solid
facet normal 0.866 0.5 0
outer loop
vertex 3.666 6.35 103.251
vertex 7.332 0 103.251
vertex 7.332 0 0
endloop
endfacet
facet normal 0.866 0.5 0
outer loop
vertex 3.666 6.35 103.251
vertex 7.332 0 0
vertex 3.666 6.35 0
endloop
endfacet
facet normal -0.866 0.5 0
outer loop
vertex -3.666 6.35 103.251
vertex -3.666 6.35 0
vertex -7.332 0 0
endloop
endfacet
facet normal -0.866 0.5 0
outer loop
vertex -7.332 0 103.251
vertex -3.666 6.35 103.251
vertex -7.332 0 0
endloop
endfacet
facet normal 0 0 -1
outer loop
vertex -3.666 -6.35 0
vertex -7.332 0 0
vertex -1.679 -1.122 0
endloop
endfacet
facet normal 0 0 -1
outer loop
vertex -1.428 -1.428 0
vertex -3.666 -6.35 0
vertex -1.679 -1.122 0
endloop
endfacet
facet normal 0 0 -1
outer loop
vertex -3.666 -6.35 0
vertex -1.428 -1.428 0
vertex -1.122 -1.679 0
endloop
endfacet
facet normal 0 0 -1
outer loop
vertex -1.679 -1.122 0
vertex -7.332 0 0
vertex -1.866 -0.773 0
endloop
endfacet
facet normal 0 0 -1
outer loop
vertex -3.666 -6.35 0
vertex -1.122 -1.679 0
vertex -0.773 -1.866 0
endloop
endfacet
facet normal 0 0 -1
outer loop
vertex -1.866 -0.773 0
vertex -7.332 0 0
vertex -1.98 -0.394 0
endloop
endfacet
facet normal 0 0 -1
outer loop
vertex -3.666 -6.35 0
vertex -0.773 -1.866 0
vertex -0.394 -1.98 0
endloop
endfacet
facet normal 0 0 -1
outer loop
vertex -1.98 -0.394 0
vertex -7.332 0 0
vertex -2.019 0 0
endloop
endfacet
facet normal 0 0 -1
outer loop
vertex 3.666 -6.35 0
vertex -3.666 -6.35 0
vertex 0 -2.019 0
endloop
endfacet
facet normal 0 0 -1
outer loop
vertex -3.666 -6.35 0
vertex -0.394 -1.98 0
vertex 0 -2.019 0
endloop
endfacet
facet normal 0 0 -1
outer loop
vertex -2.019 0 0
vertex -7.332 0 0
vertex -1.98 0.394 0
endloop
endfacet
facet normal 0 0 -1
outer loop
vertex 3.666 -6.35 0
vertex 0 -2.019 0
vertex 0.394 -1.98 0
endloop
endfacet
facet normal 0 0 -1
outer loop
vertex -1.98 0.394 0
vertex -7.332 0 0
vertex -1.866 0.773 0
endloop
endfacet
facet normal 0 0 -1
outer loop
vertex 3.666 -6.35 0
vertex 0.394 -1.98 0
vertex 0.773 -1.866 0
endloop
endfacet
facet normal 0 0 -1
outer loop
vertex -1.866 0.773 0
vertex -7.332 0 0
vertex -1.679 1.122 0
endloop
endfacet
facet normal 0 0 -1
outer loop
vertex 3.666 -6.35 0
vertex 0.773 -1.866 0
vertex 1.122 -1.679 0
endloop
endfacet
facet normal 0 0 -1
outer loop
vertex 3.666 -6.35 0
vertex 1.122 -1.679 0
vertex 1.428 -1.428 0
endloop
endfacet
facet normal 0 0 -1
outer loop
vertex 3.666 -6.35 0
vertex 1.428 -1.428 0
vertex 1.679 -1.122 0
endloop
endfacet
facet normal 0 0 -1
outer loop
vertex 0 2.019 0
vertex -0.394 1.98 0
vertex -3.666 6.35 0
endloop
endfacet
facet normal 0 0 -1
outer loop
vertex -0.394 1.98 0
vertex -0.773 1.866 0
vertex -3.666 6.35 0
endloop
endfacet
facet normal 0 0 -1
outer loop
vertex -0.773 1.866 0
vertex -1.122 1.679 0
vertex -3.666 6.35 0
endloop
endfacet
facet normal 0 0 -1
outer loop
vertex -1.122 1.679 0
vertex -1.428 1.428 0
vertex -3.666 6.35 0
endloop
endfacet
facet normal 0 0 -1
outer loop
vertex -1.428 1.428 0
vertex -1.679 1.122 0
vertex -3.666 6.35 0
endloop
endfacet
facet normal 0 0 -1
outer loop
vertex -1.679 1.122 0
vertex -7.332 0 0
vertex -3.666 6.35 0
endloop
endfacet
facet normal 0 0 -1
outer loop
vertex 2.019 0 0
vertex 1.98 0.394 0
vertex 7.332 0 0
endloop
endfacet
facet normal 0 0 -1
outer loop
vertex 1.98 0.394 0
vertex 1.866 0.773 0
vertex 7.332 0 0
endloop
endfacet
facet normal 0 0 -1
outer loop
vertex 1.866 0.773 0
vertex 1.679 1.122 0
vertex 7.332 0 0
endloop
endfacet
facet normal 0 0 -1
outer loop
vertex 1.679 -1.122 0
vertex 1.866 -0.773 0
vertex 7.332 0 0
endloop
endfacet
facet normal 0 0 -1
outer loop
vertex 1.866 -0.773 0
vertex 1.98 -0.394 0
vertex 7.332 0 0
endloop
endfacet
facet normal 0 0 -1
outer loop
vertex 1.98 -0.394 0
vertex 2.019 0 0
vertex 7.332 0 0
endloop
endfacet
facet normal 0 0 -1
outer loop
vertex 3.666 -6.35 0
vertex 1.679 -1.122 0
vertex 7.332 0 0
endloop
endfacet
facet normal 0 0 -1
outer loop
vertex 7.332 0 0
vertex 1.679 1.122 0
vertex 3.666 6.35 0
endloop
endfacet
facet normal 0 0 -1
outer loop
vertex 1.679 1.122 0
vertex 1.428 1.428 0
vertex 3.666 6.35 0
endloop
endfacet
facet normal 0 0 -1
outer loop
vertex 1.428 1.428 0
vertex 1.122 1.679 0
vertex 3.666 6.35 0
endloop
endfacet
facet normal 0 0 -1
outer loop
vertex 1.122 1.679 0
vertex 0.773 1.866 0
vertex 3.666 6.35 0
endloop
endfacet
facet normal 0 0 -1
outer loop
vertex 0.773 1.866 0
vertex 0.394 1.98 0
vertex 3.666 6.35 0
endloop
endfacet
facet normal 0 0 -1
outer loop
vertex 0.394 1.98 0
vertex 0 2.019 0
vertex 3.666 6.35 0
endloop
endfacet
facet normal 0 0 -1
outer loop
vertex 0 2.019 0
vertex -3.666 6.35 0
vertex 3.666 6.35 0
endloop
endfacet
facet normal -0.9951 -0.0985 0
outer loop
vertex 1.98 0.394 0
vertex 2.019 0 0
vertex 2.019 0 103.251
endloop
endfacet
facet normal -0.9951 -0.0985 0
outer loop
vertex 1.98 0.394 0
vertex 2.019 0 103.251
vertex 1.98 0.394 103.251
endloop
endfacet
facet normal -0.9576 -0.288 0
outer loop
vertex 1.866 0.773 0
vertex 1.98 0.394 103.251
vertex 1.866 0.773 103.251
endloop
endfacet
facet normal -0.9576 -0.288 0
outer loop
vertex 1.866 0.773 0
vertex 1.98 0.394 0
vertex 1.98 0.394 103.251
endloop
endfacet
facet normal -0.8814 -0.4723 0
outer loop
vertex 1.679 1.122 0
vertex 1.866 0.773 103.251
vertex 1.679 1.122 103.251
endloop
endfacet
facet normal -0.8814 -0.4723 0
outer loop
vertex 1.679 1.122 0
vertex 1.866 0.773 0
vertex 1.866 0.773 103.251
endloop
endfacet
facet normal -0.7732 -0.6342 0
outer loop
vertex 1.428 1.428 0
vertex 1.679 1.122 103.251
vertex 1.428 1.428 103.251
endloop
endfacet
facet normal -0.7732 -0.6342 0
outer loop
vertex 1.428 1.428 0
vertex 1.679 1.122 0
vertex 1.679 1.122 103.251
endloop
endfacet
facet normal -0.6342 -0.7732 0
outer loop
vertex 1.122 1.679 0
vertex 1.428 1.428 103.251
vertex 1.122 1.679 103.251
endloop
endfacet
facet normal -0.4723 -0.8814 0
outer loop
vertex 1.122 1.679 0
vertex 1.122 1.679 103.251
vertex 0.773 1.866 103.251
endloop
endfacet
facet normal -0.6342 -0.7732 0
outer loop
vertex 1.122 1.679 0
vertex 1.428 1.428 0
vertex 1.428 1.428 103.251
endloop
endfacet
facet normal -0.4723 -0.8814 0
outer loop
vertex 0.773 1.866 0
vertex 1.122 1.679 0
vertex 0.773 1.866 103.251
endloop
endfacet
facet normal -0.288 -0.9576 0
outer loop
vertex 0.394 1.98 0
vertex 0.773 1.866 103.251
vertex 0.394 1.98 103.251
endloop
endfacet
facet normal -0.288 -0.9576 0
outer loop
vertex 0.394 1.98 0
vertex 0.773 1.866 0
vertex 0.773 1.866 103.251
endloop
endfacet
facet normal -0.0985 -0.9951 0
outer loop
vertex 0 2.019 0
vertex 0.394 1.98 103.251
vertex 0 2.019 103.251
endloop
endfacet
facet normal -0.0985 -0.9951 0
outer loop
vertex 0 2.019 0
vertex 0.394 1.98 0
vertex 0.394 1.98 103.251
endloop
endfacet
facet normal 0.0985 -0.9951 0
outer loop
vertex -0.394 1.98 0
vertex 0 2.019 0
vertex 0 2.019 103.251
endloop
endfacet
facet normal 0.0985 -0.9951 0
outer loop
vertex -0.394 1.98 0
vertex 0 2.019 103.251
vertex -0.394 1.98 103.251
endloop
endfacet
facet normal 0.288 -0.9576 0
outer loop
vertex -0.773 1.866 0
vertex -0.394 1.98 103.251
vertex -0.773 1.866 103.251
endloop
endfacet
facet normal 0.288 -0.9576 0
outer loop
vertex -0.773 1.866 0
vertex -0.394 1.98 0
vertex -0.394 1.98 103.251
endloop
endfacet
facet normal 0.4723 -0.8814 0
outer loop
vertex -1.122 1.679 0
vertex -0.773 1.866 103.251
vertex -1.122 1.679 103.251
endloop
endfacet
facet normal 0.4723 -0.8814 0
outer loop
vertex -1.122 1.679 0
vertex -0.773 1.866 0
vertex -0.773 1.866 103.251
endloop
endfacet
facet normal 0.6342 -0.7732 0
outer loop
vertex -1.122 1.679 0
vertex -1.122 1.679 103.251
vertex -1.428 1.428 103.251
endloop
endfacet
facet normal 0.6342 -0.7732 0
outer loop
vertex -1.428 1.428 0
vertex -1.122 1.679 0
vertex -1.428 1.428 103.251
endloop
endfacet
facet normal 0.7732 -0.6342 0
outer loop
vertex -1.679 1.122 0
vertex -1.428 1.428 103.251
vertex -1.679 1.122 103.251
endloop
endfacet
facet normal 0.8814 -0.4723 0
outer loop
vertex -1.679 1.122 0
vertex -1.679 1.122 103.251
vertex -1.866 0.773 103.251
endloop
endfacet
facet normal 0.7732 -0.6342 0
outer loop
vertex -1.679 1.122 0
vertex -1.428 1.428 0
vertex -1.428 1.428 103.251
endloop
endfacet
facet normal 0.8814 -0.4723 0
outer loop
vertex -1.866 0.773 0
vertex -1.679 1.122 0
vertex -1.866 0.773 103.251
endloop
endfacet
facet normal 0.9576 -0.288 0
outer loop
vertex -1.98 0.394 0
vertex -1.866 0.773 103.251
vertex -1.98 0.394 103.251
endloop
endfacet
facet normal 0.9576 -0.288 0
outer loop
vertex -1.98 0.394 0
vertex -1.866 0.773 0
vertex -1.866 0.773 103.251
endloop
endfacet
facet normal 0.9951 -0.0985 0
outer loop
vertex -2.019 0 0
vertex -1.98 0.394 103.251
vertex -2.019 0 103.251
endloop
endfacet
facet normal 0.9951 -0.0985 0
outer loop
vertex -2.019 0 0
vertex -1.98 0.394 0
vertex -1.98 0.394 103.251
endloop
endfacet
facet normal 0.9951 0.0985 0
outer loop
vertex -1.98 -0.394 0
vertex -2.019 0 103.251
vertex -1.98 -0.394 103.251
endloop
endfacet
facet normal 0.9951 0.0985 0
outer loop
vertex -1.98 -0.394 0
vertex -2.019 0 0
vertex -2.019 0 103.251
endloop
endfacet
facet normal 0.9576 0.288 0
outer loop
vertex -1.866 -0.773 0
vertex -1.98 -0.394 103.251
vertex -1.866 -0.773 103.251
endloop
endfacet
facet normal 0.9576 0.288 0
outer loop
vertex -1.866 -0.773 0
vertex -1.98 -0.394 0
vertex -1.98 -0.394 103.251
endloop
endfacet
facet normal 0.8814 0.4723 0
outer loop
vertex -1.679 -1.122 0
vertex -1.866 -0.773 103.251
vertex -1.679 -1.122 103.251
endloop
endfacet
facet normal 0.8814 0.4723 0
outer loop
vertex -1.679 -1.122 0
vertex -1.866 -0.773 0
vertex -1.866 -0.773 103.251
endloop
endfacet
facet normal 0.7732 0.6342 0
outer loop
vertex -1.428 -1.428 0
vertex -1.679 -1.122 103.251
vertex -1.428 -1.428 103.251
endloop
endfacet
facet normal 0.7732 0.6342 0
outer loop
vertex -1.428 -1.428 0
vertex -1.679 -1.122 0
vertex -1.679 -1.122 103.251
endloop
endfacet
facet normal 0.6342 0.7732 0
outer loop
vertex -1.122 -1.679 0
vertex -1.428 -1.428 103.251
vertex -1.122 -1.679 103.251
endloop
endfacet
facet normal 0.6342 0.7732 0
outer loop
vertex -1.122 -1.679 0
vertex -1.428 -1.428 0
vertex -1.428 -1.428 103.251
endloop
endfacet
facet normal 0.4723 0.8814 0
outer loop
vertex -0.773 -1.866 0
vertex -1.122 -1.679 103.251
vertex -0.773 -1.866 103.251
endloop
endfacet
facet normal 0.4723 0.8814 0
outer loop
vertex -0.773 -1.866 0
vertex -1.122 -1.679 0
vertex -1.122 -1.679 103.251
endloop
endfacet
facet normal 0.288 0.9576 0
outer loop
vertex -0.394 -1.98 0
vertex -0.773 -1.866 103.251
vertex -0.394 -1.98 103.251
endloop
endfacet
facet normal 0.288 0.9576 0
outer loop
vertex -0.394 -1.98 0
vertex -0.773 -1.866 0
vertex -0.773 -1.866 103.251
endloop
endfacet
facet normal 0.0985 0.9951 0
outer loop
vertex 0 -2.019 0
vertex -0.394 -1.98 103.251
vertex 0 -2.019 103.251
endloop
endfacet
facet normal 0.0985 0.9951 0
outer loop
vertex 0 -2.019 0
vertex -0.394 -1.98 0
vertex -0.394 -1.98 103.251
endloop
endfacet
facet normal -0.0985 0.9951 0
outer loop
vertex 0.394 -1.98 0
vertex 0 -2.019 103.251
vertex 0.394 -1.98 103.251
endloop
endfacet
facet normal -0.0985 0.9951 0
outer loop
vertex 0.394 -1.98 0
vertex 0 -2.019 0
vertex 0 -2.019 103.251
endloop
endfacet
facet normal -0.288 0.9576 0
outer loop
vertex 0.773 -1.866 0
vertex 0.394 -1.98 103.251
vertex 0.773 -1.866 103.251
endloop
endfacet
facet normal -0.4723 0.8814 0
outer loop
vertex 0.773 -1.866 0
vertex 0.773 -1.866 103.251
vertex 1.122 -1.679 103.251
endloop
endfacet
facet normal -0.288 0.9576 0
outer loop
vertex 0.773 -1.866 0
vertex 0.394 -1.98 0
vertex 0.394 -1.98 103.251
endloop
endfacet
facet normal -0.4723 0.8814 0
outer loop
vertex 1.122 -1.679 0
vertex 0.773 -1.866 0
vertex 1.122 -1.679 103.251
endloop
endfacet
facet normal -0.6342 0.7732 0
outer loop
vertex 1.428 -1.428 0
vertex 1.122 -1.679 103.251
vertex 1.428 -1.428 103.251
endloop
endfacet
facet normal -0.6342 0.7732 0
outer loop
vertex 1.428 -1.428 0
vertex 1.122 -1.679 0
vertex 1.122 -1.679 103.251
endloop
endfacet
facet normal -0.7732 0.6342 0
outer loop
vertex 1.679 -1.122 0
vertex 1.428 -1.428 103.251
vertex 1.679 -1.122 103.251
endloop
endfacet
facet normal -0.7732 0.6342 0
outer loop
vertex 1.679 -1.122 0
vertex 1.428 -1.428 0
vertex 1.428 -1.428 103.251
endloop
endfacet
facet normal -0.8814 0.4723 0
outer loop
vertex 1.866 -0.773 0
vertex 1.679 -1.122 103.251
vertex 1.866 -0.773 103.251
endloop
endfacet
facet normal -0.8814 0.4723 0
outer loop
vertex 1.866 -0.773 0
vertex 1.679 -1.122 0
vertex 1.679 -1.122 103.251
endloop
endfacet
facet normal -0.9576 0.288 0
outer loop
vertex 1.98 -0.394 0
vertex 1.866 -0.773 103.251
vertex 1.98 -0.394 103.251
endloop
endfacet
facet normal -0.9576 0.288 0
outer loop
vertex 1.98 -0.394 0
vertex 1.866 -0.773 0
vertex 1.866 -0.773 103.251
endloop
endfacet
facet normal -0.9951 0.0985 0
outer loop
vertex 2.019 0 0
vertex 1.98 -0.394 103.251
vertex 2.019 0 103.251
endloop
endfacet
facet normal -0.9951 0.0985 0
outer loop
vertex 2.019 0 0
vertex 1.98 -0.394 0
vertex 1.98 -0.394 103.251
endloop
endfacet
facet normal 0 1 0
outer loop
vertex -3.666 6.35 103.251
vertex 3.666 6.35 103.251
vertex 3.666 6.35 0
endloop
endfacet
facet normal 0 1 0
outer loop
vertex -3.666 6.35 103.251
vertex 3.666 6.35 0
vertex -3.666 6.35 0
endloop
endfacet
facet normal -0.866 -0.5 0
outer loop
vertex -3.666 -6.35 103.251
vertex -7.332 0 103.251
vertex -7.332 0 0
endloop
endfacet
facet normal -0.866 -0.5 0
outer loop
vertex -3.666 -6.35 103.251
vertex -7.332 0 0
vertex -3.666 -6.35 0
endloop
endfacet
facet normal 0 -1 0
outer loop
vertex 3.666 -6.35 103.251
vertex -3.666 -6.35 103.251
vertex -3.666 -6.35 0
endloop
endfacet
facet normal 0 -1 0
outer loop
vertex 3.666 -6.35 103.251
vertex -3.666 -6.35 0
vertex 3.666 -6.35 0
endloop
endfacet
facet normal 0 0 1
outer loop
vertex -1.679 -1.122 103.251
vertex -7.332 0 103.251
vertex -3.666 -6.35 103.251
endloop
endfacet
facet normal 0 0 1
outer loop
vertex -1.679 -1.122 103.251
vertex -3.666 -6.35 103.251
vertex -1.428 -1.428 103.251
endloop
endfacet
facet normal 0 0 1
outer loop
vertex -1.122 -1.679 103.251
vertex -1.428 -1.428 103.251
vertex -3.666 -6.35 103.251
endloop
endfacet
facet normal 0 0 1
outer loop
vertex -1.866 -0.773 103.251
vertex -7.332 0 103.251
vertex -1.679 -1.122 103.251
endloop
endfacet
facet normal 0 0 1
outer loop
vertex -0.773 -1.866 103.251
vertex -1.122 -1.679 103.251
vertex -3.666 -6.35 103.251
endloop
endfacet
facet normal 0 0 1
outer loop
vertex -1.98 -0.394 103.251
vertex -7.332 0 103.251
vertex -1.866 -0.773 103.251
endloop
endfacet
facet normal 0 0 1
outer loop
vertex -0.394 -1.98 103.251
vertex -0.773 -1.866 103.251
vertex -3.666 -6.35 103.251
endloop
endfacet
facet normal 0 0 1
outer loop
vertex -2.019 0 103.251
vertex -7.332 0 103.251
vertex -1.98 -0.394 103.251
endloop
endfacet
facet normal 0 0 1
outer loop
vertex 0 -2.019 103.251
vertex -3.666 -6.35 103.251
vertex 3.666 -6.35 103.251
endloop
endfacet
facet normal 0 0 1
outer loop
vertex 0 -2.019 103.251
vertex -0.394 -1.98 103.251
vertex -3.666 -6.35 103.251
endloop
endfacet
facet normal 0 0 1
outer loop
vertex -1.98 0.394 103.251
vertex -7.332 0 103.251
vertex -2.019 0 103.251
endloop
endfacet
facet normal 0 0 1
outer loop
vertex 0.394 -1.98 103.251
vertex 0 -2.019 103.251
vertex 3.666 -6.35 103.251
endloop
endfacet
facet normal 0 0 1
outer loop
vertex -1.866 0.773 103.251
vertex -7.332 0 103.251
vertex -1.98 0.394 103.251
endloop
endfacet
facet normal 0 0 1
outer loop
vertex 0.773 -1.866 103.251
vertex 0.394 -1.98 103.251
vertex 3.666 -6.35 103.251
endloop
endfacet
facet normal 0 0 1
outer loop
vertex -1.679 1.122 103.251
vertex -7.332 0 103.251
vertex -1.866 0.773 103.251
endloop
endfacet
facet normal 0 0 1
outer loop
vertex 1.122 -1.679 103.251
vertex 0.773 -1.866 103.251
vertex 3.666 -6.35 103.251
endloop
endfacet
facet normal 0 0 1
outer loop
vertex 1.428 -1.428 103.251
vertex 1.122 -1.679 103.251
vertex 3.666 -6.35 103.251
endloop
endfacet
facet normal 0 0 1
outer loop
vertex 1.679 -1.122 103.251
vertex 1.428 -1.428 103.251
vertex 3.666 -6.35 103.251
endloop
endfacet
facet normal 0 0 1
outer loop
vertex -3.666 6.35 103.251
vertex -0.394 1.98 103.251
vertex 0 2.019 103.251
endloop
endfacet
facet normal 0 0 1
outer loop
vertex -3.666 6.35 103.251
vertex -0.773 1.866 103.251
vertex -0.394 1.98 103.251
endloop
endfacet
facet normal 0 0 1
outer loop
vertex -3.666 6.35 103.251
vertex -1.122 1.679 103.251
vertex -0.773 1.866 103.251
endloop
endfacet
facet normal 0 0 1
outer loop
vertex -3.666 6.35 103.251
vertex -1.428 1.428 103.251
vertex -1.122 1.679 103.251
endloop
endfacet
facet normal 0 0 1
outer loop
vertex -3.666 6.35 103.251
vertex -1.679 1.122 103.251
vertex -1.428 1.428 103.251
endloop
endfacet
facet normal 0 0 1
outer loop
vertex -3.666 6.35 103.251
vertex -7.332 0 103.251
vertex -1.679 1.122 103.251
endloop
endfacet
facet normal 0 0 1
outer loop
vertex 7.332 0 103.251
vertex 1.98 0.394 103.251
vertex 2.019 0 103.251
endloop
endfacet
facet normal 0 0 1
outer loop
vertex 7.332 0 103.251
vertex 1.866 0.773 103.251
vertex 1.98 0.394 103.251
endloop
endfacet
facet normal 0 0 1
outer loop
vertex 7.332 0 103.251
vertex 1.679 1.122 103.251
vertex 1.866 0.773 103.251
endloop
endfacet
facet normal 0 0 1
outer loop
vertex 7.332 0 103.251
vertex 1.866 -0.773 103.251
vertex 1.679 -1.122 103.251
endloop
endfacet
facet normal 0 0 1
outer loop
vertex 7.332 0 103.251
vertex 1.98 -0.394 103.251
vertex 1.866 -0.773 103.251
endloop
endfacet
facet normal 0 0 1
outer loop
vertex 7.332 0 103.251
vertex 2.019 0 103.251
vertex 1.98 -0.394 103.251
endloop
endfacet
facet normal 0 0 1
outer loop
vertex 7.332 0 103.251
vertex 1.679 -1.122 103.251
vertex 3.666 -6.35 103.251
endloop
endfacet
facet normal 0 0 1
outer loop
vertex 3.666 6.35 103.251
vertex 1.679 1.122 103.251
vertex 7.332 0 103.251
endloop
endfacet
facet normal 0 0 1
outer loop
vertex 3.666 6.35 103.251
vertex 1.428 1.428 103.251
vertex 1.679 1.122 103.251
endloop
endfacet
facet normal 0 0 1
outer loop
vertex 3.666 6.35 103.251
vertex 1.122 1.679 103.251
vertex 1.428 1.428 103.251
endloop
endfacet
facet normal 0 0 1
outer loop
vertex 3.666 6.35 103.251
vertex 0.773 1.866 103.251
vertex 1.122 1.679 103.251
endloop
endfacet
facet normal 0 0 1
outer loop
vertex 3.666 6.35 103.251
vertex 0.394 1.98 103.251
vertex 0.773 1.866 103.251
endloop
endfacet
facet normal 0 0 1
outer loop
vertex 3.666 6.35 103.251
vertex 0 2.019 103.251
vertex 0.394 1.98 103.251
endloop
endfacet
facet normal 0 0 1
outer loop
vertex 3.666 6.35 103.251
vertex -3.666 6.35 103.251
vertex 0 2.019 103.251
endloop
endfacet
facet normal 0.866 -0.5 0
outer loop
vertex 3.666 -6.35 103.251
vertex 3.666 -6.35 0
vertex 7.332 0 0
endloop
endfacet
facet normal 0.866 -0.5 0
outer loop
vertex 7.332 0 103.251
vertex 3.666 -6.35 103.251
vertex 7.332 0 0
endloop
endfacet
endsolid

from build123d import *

# Parameters (mm, degrees)
SKETCH1_R           = 4.7625
SKETCH1_R_2         = 2.0193
BOSS_EXTRUDE1_DEPTH = 103.251
SKETCH2_R           = 4.7625
BOSS_EXTRUDE2_DEPTH = 103.251


with BuildPart() as part:
    # Sketch1 → Boss-Extrude1 (new body)
    with BuildSketch(Plane.XY):
        Circle(SKETCH1_R)
        Circle(SKETCH1_R_2, mode=Mode.SUBTRACT)
    extrude(amount=BOSS_EXTRUDE1_DEPTH)

    # Sketch2 → Boss-Extrude2 (add, through all)
    with BuildSketch(Plane.XY.offset(103.251)):
        Polygon((7.332348419, 0), (3.666174209, 6.35), (-3.666174209, 6.35), (-7.332348419, 0), (-3.666174209, -6.35), (3.666174209, -6.35), align=None)
        Circle(SKETCH2_R, mode=Mode.SUBTRACT)
    extrude(amount=-BOSS_EXTRUDE2_DEPTH)


solid = part.part
